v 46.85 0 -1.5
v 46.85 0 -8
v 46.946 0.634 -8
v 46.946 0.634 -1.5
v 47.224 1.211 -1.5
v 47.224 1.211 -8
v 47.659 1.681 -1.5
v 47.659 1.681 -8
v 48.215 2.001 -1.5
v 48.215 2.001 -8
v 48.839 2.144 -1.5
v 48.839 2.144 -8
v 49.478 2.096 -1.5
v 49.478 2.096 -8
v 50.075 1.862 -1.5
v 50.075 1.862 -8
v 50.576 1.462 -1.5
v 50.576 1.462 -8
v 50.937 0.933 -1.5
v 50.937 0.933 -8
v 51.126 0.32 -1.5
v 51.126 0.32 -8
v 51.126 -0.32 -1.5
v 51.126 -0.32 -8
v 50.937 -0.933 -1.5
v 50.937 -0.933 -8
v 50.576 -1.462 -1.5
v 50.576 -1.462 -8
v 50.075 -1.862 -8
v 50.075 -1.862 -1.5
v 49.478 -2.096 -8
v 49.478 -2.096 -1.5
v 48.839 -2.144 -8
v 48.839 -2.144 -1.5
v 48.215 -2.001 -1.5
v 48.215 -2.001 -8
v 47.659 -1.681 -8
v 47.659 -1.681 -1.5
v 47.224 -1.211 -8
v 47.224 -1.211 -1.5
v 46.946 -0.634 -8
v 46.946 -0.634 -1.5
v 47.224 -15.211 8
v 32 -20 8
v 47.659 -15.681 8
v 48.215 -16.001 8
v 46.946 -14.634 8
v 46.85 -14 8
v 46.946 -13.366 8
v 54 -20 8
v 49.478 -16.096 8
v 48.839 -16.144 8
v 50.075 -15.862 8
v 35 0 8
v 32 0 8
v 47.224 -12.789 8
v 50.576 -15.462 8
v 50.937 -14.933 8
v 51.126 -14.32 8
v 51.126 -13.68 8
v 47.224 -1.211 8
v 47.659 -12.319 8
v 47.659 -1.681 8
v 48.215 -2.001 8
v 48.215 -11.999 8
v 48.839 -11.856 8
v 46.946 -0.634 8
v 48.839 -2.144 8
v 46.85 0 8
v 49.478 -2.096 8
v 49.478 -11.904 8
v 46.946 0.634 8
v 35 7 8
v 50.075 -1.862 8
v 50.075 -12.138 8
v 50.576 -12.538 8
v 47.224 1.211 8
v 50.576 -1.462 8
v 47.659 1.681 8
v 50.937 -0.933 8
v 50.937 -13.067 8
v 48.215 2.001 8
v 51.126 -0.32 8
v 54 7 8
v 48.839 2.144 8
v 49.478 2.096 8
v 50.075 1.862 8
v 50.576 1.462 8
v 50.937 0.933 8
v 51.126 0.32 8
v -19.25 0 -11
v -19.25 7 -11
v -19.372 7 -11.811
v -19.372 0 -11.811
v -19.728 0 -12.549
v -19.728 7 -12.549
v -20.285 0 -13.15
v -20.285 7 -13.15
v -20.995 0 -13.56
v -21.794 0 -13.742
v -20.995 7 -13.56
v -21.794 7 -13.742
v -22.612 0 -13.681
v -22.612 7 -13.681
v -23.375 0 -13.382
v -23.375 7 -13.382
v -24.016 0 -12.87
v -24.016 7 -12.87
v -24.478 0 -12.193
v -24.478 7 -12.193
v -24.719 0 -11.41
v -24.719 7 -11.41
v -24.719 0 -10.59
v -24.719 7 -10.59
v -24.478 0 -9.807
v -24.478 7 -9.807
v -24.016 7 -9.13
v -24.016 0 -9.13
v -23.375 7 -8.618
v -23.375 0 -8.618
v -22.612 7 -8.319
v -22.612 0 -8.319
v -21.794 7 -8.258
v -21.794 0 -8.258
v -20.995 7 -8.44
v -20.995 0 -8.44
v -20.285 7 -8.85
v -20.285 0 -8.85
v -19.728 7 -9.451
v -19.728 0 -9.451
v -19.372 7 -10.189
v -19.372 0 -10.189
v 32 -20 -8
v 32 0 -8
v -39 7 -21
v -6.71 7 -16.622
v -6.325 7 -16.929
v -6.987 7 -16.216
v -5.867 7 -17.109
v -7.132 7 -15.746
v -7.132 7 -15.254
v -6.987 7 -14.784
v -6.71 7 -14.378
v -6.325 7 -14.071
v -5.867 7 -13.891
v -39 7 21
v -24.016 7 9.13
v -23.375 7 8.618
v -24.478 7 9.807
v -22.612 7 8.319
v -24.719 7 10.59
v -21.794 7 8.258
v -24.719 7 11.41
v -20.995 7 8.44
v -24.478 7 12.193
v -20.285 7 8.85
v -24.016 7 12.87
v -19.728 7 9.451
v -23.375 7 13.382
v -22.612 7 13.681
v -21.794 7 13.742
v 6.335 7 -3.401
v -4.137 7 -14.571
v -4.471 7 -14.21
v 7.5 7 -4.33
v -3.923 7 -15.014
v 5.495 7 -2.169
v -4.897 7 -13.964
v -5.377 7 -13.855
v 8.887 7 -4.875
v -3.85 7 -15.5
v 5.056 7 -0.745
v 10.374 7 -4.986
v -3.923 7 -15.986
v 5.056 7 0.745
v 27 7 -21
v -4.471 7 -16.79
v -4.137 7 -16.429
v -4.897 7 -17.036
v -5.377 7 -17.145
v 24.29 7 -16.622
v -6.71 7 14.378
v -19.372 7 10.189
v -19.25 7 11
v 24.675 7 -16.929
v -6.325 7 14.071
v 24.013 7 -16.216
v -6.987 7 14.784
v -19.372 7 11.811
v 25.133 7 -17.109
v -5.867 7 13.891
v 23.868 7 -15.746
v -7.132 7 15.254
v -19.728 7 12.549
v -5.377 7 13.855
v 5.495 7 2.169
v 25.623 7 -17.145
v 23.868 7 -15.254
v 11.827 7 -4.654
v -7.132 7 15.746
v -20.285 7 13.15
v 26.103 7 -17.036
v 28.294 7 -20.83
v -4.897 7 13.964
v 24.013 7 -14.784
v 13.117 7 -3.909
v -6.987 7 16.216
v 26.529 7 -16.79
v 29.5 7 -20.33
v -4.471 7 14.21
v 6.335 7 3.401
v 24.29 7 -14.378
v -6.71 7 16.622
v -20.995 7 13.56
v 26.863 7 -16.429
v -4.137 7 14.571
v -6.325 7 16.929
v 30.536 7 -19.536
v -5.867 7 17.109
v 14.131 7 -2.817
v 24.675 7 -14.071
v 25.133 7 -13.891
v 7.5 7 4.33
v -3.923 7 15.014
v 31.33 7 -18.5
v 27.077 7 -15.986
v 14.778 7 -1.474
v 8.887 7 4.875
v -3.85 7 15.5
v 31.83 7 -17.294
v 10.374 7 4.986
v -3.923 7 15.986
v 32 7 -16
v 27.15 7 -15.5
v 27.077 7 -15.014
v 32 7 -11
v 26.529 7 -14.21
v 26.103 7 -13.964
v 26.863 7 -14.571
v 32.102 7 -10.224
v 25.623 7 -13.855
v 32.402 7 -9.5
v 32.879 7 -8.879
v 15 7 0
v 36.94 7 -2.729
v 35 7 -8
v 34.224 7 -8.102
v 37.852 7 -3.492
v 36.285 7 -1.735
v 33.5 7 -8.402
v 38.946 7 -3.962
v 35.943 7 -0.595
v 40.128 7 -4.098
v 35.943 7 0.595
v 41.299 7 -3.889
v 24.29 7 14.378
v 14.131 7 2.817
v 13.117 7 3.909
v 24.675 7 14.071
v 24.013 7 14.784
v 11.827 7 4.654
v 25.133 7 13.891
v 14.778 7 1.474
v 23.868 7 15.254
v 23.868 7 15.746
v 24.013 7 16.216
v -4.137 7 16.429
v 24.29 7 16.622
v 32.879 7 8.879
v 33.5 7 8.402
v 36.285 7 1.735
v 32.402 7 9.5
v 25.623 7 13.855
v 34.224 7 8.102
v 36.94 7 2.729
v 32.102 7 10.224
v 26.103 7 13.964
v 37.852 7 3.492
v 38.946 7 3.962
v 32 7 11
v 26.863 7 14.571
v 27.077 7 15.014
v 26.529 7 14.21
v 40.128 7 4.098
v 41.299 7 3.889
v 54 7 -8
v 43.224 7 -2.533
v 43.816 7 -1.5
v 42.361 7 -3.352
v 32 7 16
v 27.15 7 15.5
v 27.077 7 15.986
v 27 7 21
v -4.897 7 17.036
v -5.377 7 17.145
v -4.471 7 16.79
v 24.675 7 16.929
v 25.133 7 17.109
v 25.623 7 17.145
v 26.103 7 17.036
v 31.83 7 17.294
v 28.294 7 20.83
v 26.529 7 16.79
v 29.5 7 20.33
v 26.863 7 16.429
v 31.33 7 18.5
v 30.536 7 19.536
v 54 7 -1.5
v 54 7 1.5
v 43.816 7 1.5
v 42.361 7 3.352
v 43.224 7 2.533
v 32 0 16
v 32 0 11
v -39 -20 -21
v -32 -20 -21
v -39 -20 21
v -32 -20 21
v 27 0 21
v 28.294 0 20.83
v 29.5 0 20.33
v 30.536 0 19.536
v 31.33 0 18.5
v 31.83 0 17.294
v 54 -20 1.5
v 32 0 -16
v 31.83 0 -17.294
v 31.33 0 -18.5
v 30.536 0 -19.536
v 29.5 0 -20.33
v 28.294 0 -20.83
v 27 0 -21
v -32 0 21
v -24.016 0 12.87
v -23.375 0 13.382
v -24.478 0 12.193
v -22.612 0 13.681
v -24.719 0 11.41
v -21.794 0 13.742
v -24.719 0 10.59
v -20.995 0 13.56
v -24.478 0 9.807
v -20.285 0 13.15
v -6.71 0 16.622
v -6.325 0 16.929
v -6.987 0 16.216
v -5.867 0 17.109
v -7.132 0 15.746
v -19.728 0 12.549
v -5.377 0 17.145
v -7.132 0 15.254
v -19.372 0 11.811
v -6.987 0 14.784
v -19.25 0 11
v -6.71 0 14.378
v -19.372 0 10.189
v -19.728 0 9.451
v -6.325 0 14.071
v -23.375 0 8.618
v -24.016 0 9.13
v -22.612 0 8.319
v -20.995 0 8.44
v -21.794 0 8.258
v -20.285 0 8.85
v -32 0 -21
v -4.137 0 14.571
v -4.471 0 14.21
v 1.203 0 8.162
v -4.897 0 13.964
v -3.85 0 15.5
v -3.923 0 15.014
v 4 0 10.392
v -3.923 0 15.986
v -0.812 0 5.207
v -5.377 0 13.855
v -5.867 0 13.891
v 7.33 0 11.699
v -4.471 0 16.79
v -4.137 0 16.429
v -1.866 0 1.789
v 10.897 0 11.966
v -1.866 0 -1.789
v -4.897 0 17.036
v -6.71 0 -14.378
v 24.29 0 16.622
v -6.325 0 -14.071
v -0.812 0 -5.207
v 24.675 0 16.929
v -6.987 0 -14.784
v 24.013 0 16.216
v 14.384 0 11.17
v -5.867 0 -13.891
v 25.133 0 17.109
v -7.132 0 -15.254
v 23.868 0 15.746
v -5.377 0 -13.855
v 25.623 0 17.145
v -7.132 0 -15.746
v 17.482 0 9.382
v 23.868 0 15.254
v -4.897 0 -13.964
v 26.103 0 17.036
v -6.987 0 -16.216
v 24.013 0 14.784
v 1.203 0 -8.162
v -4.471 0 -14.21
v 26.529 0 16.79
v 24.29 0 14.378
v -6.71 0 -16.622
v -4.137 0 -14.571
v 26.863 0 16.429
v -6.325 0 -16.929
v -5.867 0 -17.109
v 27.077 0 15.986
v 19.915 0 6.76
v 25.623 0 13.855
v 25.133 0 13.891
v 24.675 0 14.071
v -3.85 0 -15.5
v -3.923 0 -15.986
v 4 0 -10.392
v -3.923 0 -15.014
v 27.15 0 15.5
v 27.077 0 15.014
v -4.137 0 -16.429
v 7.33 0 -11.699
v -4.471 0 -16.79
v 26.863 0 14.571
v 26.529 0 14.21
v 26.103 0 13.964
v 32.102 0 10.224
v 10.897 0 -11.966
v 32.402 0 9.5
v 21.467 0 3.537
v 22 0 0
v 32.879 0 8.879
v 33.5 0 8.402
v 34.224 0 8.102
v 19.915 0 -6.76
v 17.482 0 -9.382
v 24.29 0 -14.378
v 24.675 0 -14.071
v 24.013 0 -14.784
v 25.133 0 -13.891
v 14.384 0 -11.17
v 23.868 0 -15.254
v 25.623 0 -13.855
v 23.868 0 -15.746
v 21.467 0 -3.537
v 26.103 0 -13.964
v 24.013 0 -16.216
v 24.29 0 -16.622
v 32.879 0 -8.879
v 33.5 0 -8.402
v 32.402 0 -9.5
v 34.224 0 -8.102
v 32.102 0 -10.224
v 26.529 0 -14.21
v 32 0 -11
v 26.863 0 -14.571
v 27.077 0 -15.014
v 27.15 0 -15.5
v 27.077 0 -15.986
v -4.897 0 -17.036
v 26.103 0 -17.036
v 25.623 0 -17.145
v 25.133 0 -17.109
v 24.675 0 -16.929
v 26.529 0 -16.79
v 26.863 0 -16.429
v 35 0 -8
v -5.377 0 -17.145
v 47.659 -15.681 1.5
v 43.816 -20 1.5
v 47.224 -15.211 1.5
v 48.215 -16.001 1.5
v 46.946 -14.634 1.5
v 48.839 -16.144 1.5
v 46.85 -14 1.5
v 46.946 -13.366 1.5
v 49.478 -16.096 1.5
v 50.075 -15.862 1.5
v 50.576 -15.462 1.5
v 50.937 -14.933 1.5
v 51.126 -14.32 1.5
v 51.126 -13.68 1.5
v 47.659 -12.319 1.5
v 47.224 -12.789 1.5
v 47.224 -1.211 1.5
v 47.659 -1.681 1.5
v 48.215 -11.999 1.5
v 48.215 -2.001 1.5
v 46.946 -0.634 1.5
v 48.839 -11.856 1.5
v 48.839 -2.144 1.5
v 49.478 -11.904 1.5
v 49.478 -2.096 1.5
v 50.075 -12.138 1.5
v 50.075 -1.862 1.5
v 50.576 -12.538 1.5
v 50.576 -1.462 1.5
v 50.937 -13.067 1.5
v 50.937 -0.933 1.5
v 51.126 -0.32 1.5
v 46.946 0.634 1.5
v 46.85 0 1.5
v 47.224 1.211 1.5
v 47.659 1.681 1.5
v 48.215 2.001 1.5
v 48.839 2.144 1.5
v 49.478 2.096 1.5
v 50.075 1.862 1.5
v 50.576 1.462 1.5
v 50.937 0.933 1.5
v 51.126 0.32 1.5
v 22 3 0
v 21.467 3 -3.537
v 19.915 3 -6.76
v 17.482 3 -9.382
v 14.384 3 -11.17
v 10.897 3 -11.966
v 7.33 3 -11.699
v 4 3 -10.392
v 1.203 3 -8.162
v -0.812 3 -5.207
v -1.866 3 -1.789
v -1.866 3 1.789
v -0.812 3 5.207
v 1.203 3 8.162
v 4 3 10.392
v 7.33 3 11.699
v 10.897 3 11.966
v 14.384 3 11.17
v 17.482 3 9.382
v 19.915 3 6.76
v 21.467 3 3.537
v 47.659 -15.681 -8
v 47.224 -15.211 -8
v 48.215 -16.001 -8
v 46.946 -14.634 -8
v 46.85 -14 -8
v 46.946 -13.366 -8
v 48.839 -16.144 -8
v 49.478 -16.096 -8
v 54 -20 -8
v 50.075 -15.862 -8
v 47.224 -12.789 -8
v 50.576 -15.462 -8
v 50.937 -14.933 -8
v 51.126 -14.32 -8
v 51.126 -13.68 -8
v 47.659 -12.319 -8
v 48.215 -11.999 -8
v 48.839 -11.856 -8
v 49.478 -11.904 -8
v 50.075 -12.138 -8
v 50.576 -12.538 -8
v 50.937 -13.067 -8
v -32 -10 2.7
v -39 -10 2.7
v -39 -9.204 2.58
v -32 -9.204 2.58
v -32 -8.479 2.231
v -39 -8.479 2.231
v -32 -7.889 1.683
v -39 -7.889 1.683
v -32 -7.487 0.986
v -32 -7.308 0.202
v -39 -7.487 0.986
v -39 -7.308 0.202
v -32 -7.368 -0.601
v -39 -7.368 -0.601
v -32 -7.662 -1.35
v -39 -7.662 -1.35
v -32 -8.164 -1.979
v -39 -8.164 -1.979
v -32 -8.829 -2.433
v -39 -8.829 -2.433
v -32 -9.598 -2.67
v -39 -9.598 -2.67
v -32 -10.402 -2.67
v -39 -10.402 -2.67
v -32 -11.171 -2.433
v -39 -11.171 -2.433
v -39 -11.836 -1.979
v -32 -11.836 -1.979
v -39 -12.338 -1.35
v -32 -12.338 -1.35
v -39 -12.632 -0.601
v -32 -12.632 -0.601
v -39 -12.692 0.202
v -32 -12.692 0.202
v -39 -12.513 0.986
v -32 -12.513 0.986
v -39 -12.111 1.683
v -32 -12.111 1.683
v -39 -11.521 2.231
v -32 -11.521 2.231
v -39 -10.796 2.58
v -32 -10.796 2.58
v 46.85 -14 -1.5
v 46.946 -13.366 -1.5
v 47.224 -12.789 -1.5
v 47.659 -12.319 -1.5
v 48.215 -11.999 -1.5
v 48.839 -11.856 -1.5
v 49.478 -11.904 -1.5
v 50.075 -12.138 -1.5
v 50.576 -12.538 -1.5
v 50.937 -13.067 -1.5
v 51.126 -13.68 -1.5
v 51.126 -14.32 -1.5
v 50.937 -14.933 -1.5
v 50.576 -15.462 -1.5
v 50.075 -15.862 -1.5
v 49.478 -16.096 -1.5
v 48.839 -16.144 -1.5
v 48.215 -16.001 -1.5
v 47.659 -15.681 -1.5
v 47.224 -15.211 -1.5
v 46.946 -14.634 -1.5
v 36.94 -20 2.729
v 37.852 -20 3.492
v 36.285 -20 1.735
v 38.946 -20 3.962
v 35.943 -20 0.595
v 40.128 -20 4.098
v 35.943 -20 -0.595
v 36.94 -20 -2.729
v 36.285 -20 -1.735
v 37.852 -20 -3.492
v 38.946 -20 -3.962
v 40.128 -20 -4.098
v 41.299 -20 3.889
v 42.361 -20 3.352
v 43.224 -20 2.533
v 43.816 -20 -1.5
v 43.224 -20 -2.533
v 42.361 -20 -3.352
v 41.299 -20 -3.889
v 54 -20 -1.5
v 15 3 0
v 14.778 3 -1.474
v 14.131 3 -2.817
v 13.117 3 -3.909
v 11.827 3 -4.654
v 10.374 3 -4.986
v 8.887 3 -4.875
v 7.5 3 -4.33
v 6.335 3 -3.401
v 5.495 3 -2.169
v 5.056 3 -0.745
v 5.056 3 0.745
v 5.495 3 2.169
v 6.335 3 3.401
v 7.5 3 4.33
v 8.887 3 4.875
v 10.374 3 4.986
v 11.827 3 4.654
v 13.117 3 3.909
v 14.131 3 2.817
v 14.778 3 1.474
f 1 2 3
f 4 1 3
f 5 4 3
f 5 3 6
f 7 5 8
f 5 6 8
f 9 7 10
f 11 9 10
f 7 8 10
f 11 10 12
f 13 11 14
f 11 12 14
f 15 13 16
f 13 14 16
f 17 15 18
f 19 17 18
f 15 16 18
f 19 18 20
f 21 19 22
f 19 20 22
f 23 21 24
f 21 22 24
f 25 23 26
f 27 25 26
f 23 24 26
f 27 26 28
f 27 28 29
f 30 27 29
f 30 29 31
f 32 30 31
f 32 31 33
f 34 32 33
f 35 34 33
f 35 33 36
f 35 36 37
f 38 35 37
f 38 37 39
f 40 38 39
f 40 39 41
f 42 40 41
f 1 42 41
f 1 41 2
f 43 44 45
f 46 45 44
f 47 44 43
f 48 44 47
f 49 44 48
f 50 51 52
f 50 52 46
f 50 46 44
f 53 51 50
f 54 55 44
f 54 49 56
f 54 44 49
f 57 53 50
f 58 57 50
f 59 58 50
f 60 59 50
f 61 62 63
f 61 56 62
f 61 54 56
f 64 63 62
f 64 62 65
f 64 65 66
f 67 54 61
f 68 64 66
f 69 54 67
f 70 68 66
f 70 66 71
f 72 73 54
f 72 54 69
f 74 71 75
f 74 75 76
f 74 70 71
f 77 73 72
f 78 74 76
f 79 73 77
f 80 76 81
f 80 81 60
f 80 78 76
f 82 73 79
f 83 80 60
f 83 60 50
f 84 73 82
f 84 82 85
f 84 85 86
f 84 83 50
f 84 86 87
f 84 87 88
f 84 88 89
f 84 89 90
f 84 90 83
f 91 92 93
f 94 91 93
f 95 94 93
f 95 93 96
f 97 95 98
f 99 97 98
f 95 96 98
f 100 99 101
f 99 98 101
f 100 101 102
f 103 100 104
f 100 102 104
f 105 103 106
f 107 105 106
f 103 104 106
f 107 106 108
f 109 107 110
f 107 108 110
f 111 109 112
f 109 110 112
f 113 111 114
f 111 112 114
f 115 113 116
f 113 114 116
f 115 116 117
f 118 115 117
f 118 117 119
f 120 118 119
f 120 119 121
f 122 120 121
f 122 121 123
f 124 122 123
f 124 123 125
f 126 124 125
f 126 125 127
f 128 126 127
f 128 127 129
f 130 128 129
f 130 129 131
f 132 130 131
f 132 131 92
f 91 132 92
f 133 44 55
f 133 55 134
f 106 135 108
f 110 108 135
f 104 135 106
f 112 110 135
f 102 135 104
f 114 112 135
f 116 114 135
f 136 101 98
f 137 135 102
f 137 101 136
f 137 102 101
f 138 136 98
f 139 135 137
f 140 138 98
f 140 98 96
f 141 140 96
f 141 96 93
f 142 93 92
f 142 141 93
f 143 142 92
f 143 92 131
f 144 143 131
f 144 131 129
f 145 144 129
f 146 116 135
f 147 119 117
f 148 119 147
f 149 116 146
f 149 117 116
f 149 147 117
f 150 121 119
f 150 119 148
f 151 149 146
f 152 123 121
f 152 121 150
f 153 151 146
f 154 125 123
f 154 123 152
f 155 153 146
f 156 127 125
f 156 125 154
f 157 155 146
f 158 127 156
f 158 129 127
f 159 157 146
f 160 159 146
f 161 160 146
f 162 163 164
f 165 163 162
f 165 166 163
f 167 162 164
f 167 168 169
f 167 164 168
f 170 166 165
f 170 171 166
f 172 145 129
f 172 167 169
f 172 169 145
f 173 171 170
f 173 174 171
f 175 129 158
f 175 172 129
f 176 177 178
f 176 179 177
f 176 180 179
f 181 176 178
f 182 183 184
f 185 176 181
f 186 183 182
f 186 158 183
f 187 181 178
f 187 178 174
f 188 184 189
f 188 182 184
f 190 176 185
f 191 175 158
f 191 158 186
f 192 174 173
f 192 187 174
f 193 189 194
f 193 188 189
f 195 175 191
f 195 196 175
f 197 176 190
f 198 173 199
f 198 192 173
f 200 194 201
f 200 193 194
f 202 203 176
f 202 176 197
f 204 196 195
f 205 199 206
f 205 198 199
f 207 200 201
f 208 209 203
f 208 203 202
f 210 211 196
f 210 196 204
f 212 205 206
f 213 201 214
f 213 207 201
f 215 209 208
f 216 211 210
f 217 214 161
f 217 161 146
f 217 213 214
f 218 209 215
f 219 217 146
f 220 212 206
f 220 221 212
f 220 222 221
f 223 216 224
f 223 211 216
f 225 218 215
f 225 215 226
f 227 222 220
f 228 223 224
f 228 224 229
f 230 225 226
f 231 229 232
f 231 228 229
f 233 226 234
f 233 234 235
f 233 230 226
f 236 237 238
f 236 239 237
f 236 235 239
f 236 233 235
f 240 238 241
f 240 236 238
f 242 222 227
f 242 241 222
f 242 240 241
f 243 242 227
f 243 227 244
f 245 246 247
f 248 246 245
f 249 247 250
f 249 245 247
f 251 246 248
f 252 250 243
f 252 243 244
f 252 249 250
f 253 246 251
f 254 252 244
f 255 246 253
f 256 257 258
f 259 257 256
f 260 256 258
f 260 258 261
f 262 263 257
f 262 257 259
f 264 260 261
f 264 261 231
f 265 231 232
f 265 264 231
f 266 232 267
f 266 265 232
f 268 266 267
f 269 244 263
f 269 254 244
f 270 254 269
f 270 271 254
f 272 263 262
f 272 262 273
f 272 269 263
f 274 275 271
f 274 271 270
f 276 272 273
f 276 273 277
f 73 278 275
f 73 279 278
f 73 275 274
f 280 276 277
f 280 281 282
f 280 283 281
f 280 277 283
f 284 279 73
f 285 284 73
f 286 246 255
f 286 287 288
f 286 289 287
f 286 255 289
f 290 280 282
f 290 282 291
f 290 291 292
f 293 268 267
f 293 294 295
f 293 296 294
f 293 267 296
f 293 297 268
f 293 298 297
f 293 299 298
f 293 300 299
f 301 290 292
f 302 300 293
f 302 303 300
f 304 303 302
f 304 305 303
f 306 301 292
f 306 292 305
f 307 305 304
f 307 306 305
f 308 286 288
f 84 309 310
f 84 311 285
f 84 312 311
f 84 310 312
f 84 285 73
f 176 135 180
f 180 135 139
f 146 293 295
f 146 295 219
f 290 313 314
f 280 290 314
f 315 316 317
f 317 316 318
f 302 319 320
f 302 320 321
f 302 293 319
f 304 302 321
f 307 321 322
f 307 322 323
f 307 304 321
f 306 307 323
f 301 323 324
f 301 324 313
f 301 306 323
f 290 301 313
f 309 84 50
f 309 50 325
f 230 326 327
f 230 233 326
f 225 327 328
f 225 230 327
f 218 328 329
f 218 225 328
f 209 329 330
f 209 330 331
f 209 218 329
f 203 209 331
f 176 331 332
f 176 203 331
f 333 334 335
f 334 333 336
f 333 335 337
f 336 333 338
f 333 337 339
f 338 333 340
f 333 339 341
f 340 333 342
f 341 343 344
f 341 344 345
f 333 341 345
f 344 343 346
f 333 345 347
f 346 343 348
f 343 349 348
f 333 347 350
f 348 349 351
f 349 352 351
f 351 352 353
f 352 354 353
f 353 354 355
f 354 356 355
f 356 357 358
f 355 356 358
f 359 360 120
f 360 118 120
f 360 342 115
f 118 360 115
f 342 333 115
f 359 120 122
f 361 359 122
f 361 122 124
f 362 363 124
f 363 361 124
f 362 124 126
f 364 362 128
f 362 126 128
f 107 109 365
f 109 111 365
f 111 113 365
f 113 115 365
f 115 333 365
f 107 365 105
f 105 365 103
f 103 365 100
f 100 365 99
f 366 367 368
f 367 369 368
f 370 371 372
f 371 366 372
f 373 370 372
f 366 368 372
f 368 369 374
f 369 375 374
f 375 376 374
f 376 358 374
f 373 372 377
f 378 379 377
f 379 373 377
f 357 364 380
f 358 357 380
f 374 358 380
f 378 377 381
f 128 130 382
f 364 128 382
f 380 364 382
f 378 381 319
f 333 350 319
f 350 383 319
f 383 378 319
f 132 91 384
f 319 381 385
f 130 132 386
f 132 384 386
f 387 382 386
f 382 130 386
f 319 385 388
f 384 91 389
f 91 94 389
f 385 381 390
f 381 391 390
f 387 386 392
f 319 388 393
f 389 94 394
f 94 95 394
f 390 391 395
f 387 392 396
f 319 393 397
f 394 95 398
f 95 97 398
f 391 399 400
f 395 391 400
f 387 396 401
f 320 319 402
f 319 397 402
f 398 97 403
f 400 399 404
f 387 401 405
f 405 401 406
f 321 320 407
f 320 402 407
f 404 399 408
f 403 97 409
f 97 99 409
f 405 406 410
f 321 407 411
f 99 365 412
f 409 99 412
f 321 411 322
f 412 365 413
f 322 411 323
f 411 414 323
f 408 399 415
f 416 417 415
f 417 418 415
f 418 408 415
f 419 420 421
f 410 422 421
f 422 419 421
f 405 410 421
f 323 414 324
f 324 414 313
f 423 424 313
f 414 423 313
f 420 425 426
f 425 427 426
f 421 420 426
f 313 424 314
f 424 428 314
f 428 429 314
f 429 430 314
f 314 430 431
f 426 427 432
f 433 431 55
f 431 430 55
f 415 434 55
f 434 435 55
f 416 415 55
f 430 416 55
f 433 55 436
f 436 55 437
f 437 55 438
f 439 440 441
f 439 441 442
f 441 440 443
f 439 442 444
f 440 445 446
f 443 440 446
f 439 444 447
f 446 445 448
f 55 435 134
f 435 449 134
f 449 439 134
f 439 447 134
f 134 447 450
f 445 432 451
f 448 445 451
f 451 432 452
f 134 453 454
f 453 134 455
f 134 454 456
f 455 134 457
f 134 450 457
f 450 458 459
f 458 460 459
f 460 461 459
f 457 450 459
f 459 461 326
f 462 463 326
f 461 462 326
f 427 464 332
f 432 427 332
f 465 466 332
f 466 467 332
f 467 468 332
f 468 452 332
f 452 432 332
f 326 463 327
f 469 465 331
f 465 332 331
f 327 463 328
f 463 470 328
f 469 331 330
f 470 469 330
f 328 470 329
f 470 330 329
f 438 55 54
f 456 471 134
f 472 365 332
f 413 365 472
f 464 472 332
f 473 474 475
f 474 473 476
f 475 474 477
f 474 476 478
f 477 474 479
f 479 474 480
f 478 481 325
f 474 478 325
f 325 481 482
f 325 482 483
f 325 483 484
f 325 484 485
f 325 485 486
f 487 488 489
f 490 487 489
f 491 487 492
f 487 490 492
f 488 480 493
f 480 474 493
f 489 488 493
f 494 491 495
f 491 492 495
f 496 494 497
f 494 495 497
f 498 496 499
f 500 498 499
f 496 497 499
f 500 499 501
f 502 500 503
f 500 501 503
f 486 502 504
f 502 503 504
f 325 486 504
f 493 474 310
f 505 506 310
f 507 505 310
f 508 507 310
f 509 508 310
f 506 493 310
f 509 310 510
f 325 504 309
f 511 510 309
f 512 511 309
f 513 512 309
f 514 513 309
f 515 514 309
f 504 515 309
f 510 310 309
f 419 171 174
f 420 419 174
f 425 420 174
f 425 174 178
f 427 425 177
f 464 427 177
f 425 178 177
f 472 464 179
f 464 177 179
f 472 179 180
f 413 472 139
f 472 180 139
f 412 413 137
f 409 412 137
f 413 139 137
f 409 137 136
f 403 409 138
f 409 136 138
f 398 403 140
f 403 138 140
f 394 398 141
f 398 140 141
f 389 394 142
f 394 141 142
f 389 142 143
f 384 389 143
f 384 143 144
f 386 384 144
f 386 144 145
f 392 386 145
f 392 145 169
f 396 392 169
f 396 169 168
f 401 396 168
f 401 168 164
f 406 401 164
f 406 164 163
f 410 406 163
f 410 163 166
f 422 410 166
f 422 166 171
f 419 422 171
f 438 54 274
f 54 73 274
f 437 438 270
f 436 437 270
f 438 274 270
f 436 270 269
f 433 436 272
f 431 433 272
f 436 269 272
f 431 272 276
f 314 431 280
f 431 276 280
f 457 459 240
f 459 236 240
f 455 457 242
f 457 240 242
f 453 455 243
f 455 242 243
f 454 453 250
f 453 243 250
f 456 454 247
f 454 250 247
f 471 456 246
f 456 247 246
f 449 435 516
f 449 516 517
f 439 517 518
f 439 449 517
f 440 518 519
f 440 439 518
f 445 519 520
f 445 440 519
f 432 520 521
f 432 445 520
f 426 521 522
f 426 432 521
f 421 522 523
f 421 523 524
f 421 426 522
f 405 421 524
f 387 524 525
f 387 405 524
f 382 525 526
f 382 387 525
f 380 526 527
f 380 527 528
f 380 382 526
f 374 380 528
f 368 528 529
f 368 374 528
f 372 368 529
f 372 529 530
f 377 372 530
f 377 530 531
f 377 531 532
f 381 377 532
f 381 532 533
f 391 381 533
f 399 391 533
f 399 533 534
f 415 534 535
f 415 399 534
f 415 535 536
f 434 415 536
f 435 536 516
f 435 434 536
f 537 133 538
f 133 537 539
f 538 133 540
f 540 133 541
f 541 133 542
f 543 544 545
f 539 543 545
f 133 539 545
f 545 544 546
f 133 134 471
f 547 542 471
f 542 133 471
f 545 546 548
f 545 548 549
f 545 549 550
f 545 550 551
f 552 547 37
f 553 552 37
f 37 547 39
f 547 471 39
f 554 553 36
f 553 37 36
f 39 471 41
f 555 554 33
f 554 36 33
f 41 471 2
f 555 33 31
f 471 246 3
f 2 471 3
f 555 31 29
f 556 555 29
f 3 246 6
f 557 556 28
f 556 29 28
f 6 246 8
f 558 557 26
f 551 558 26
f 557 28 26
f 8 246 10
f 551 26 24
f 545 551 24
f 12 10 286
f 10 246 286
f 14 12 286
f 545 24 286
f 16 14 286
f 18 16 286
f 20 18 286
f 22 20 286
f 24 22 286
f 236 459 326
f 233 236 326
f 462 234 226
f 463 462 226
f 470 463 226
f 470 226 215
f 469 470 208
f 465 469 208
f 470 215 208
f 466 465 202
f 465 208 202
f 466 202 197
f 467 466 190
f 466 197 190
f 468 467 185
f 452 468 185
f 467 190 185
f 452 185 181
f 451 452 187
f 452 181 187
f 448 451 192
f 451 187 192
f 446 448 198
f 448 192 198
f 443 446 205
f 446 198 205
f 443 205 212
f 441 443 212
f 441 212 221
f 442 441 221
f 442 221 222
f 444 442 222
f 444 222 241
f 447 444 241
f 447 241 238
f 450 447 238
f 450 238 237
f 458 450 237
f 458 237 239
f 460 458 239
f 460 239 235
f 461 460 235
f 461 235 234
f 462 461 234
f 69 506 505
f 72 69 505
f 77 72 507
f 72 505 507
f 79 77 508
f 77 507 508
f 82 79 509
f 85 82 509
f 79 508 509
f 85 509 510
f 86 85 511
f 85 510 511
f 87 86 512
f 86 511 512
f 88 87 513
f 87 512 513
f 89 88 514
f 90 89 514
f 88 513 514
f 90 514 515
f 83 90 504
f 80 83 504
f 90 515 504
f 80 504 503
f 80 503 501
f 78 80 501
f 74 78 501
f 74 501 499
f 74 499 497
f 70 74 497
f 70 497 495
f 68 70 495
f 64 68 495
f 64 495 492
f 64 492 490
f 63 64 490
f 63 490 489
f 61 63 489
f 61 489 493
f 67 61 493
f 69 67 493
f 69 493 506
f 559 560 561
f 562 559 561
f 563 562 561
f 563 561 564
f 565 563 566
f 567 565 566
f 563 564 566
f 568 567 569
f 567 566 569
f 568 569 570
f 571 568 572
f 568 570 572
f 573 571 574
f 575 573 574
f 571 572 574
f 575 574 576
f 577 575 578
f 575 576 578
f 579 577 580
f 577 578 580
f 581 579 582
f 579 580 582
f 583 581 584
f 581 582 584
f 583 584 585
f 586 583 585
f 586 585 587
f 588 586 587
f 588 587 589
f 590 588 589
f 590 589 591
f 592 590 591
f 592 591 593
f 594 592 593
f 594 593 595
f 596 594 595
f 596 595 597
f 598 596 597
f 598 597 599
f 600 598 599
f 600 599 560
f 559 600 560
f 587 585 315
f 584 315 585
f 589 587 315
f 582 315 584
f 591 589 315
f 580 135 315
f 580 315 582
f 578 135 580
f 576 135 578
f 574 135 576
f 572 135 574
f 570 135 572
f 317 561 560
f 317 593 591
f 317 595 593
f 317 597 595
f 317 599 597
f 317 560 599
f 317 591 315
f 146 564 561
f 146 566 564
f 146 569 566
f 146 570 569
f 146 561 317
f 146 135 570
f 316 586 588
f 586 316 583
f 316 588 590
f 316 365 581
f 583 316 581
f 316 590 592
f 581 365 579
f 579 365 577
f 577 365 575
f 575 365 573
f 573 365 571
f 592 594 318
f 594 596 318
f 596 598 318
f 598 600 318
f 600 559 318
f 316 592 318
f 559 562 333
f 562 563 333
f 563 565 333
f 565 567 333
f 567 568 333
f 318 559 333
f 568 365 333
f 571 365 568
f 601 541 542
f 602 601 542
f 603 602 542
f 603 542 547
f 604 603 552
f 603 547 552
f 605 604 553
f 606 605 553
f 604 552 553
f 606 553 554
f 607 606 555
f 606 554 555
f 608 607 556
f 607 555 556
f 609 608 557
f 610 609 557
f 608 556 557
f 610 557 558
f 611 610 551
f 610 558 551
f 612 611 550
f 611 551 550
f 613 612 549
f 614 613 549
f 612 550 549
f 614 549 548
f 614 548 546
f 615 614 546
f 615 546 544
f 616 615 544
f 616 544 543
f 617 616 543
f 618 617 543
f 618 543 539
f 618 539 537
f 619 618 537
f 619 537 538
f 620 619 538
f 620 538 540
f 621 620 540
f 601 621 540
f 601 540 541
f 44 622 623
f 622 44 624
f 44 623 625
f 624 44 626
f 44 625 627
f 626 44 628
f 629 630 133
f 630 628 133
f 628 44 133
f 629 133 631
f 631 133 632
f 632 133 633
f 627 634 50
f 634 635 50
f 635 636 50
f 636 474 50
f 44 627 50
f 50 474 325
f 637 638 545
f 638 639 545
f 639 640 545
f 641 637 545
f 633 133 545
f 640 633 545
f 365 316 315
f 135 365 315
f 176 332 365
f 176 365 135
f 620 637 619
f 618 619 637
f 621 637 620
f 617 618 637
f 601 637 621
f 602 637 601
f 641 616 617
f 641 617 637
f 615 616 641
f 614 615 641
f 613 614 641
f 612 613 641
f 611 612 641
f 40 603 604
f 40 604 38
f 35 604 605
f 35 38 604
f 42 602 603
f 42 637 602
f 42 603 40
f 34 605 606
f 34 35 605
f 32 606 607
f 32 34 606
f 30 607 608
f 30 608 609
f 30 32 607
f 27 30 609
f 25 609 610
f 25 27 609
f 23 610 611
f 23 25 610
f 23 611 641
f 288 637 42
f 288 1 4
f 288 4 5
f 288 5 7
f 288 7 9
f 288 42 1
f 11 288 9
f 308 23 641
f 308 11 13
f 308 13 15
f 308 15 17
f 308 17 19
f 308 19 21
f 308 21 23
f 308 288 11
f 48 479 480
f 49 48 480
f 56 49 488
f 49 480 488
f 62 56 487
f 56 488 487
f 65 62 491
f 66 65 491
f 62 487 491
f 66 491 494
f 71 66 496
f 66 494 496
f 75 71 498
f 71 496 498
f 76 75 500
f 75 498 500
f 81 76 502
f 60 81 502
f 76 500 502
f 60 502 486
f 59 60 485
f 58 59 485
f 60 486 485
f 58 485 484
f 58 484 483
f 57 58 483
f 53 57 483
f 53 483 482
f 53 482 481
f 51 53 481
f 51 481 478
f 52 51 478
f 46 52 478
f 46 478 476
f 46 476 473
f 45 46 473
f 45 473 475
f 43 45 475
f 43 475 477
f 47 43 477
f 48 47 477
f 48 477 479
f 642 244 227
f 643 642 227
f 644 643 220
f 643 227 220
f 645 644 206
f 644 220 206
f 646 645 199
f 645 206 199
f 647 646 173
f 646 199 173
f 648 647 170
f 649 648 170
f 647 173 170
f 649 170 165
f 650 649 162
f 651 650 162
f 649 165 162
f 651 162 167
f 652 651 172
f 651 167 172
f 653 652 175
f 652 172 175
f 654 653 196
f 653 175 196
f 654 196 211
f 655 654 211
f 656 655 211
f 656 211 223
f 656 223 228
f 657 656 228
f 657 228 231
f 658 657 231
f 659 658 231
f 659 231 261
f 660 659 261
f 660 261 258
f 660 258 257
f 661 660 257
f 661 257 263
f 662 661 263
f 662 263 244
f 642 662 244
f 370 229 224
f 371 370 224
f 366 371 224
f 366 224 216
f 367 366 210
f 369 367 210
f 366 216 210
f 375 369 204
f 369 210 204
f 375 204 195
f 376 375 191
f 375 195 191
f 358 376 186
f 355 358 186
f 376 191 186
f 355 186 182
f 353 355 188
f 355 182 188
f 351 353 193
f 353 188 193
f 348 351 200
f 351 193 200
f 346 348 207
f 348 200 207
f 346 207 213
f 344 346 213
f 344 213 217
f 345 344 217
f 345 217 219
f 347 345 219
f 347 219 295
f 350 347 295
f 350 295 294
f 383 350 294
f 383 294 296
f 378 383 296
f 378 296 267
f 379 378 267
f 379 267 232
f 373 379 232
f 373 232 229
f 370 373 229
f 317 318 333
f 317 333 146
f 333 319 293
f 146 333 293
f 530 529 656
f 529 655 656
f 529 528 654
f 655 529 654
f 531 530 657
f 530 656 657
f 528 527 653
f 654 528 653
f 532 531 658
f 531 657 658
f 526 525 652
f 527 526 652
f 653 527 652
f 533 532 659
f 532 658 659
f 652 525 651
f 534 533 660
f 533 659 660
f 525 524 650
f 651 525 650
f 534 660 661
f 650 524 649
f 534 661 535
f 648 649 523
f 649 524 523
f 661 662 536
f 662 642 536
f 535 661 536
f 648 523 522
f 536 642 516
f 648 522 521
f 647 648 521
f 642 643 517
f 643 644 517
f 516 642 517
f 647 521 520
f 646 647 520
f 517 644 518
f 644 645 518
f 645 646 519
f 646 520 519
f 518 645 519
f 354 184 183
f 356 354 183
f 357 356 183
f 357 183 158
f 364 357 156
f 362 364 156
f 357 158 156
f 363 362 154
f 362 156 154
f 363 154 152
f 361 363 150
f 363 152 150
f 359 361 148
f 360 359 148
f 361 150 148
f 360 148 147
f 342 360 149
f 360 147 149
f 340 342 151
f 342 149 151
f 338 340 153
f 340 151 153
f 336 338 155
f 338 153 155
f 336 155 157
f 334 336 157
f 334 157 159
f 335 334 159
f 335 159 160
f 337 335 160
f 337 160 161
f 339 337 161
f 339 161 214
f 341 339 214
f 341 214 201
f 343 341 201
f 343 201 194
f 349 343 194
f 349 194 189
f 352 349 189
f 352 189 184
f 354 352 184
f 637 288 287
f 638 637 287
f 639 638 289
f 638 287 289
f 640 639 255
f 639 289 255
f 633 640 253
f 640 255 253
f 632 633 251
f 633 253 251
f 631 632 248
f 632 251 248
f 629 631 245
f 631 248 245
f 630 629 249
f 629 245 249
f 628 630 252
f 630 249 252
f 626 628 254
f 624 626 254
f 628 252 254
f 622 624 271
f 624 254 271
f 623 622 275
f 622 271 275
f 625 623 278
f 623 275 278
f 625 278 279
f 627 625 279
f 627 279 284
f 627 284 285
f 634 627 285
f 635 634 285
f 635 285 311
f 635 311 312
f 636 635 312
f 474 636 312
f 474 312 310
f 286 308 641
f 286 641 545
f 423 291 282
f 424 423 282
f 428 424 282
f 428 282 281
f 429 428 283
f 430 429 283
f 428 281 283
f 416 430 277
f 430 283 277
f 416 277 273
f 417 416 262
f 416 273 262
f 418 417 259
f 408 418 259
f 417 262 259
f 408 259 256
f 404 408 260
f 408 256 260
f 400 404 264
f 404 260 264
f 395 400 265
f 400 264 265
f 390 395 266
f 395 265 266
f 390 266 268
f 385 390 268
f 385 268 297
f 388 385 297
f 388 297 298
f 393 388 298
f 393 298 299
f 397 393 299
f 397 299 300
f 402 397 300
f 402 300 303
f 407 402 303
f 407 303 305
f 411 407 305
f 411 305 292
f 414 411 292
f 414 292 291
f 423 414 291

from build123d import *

# Parameters (mm, degrees)
SKETCH1_W                = 64
SKETCH1_H                = 42
BOSS_EXTRUDE1_DEPTH      = 7
SKETCH11_W               = 22
SKETCH11_H               = 16
BOSS_EXTRUDE3_DEPTH      = 7
BOSS_EXTRUDE3_DEPTH_BACK = 20
SKETCH3_R                = 12
CUT_EXTRUDE2_DEPTH       = 3
SKETCH2_R                = 4.1
CUT_EXTRUDE1_DEPTH       = 28
SKETCH4_R                = 2.75
CUT_EXTRUDE3_DEPTH       = 28
SKETCH7_R                = 1.65
CUT_EXTRUDE5_DEPTH       = 28
SKETCH8_W                = 42
SKETCH8_H                = 27
BOSS_EXTRUDE2_DEPTH      = 7
SKETCH9_R                = 2.7
CUT_EXTRUDE6_DEPTH       = 1
CUT_EXTRUDE6_DEPTH_BACK  = 13
SKETCH10_R               = 5
CUT_EXTRUDE7_DEPTH       = 20
SKETCH15_R               = 2.15
CUT_EXTRUDE8_DEPTH       = 22
SKETCH16_W               = 14
SKETCH16_H               = 3
CUT_EXTRUDE9_DEPTH       = 28
FILLET1_R                = 3
FILLET2_R                = 5


with BuildPart() as part:
    # Sketch1 → Boss-Extrude1 (new body)
    with BuildSketch(Plane(origin=(0, 0, 0), x_dir=(1, 0, 0), z_dir=(0, 1, 0))):
        Rectangle(SKETCH1_W, SKETCH1_H)
    extrude(amount=BOSS_EXTRUDE1_DEPTH)

    # Sketch11 → Boss-Extrude3 (add, two sides)
    with BuildSketch(Plane(origin=(0, 0, 0), x_dir=(1, 0, 0), z_dir=(0, 1, 0))) as boss_extrude3_sk:
        with Locations((43, 0)):
            Rectangle(SKETCH11_W, SKETCH11_H)
    extrude(amount=BOSS_EXTRUDE3_DEPTH)
    extrude(boss_extrude3_sk.sketch, amount=-BOSS_EXTRUDE3_DEPTH_BACK)

    # Sketch3 → Cut-Extrude2 (cut)
    with BuildSketch(Plane(origin=(0, 0, 0), x_dir=(1, 0, 0), z_dir=(0, 1, 0))):
        with Locations((10, 0)):
            Circle(SKETCH3_R)
    extrude(amount=CUT_EXTRUDE2_DEPTH, mode=Mode.SUBTRACT)

    # Sketch2 → Cut-Extrude1 (cut, through all)
    with BuildSketch(Plane(origin=(0, 7, 0), x_dir=(1, 0, 0), z_dir=(0, 1, 0))):
        with Locations((40, 0)):
            Circle(SKETCH2_R)
    extrude(amount=-CUT_EXTRUDE1_DEPTH, mode=Mode.SUBTRACT)

    # Sketch4 → Cut-Extrude3 (cut, through all)
    with BuildSketch(Plane(origin=(0, 7, 0), x_dir=(1, 0, 0), z_dir=(0, 1, 0))):
        with Locations((-22, 11)):
            Circle(SKETCH4_R)
        with Locations((-22, -11)):
            Circle(SKETCH4_R)
    extrude(amount=-CUT_EXTRUDE3_DEPTH, mode=Mode.SUBTRACT)

    # Sketch7 → Cut-Extrude5 (cut, through all)
    with BuildSketch(Plane(origin=(0, 7, 0), x_dir=(1, 0, 0), z_dir=(0, 1, 0))):
        with Locations((-5.5, 15.5)):
            Circle(SKETCH7_R)
        with Locations((25.5, 15.5)):
            Circle(SKETCH7_R)
        with Locations((25.5, -15.5)):
            Circle(SKETCH7_R)
        with Locations((-5.5, -15.5)):
            Circle(SKETCH7_R)
    extrude(amount=-CUT_EXTRUDE5_DEPTH, mode=Mode.SUBTRACT)

    # Sketch8 → Boss-Extrude2 (add)
    with BuildSketch(Plane.ZY.offset(32)):
        with Locations((0, -6.5)):
            Rectangle(SKETCH8_W, SKETCH8_H)
    extrude(amount=BOSS_EXTRUDE2_DEPTH)

    # Sketch9 → Cut-Extrude6 (cut, two sides)
    with BuildSketch(Plane.ZY.offset(39)) as cut_extrude6_sk:
        with Locations((0, -10)):
            Circle(SKETCH9_R)
    extrude(amount=CUT_EXTRUDE6_DEPTH, mode=Mode.SUBTRACT)
    extrude(cut_extrude6_sk.sketch, amount=-CUT_EXTRUDE6_DEPTH_BACK, mode=Mode.SUBTRACT)

    # Sketch10 → Cut-Extrude7 (cut)
    with BuildSketch(Plane(origin=(0, 7, 0), x_dir=(1, 0, 0), z_dir=(0, 1, 0))):
        with Locations((10, 0)):
            Circle(SKETCH10_R)
    extrude(amount=-CUT_EXTRUDE7_DEPTH, mode=Mode.SUBTRACT)

    # Sketch15 → Cut-Extrude8 (cut)
    with BuildSketch(Plane(origin=(0, 0, -8), x_dir=(-1, 0, 0), z_dir=(0, 0, -1))):
        with Locations((-49, 0)):
            Circle(SKETCH15_R)
        with Locations((-49, -14)):
            Circle(SKETCH15_R)
    extrude(amount=-CUT_EXTRUDE8_DEPTH, mode=Mode.SUBTRACT)

    # Sketch16 → Cut-Extrude9 (cut, through all)
    with BuildSketch(Plane(origin=(0, 7, 0), x_dir=(1, 0, 0), z_dir=(0, 1, 0))):
        with Locations((47, 0)):
            Rectangle(SKETCH16_W, SKETCH16_H)
    extrude(amount=-CUT_EXTRUDE9_DEPTH, mode=Mode.SUBTRACT)

    # Fillet1
    fillet1_edges = [part.edges().sort_by_distance(p)[0] for p in [
        (32, 3.5, -8),
        (32, 3.5, 8),
    ]]
    fillet(fillet1_edges, radius=FILLET1_R)

    # Fillet2
    fillet2_edges = [part.edges().sort_by_distance(p)[0] for p in [
        (32, 3.5, 21),
        (32, 3.5, -21),
    ]]
    fillet(fillet2_edges, radius=FILLET2_R)


solid = part.part
